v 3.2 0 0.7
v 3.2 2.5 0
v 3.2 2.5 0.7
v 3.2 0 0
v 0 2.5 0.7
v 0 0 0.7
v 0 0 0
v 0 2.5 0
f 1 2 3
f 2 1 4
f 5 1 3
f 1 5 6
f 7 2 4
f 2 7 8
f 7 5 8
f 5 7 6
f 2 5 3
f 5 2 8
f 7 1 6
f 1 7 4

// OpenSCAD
cube([3.2,2.5,0.7],[0,0,0]);
translate([0.4,0.4,0.5])cylinder(0.2,r=0.2, $fn=100);
